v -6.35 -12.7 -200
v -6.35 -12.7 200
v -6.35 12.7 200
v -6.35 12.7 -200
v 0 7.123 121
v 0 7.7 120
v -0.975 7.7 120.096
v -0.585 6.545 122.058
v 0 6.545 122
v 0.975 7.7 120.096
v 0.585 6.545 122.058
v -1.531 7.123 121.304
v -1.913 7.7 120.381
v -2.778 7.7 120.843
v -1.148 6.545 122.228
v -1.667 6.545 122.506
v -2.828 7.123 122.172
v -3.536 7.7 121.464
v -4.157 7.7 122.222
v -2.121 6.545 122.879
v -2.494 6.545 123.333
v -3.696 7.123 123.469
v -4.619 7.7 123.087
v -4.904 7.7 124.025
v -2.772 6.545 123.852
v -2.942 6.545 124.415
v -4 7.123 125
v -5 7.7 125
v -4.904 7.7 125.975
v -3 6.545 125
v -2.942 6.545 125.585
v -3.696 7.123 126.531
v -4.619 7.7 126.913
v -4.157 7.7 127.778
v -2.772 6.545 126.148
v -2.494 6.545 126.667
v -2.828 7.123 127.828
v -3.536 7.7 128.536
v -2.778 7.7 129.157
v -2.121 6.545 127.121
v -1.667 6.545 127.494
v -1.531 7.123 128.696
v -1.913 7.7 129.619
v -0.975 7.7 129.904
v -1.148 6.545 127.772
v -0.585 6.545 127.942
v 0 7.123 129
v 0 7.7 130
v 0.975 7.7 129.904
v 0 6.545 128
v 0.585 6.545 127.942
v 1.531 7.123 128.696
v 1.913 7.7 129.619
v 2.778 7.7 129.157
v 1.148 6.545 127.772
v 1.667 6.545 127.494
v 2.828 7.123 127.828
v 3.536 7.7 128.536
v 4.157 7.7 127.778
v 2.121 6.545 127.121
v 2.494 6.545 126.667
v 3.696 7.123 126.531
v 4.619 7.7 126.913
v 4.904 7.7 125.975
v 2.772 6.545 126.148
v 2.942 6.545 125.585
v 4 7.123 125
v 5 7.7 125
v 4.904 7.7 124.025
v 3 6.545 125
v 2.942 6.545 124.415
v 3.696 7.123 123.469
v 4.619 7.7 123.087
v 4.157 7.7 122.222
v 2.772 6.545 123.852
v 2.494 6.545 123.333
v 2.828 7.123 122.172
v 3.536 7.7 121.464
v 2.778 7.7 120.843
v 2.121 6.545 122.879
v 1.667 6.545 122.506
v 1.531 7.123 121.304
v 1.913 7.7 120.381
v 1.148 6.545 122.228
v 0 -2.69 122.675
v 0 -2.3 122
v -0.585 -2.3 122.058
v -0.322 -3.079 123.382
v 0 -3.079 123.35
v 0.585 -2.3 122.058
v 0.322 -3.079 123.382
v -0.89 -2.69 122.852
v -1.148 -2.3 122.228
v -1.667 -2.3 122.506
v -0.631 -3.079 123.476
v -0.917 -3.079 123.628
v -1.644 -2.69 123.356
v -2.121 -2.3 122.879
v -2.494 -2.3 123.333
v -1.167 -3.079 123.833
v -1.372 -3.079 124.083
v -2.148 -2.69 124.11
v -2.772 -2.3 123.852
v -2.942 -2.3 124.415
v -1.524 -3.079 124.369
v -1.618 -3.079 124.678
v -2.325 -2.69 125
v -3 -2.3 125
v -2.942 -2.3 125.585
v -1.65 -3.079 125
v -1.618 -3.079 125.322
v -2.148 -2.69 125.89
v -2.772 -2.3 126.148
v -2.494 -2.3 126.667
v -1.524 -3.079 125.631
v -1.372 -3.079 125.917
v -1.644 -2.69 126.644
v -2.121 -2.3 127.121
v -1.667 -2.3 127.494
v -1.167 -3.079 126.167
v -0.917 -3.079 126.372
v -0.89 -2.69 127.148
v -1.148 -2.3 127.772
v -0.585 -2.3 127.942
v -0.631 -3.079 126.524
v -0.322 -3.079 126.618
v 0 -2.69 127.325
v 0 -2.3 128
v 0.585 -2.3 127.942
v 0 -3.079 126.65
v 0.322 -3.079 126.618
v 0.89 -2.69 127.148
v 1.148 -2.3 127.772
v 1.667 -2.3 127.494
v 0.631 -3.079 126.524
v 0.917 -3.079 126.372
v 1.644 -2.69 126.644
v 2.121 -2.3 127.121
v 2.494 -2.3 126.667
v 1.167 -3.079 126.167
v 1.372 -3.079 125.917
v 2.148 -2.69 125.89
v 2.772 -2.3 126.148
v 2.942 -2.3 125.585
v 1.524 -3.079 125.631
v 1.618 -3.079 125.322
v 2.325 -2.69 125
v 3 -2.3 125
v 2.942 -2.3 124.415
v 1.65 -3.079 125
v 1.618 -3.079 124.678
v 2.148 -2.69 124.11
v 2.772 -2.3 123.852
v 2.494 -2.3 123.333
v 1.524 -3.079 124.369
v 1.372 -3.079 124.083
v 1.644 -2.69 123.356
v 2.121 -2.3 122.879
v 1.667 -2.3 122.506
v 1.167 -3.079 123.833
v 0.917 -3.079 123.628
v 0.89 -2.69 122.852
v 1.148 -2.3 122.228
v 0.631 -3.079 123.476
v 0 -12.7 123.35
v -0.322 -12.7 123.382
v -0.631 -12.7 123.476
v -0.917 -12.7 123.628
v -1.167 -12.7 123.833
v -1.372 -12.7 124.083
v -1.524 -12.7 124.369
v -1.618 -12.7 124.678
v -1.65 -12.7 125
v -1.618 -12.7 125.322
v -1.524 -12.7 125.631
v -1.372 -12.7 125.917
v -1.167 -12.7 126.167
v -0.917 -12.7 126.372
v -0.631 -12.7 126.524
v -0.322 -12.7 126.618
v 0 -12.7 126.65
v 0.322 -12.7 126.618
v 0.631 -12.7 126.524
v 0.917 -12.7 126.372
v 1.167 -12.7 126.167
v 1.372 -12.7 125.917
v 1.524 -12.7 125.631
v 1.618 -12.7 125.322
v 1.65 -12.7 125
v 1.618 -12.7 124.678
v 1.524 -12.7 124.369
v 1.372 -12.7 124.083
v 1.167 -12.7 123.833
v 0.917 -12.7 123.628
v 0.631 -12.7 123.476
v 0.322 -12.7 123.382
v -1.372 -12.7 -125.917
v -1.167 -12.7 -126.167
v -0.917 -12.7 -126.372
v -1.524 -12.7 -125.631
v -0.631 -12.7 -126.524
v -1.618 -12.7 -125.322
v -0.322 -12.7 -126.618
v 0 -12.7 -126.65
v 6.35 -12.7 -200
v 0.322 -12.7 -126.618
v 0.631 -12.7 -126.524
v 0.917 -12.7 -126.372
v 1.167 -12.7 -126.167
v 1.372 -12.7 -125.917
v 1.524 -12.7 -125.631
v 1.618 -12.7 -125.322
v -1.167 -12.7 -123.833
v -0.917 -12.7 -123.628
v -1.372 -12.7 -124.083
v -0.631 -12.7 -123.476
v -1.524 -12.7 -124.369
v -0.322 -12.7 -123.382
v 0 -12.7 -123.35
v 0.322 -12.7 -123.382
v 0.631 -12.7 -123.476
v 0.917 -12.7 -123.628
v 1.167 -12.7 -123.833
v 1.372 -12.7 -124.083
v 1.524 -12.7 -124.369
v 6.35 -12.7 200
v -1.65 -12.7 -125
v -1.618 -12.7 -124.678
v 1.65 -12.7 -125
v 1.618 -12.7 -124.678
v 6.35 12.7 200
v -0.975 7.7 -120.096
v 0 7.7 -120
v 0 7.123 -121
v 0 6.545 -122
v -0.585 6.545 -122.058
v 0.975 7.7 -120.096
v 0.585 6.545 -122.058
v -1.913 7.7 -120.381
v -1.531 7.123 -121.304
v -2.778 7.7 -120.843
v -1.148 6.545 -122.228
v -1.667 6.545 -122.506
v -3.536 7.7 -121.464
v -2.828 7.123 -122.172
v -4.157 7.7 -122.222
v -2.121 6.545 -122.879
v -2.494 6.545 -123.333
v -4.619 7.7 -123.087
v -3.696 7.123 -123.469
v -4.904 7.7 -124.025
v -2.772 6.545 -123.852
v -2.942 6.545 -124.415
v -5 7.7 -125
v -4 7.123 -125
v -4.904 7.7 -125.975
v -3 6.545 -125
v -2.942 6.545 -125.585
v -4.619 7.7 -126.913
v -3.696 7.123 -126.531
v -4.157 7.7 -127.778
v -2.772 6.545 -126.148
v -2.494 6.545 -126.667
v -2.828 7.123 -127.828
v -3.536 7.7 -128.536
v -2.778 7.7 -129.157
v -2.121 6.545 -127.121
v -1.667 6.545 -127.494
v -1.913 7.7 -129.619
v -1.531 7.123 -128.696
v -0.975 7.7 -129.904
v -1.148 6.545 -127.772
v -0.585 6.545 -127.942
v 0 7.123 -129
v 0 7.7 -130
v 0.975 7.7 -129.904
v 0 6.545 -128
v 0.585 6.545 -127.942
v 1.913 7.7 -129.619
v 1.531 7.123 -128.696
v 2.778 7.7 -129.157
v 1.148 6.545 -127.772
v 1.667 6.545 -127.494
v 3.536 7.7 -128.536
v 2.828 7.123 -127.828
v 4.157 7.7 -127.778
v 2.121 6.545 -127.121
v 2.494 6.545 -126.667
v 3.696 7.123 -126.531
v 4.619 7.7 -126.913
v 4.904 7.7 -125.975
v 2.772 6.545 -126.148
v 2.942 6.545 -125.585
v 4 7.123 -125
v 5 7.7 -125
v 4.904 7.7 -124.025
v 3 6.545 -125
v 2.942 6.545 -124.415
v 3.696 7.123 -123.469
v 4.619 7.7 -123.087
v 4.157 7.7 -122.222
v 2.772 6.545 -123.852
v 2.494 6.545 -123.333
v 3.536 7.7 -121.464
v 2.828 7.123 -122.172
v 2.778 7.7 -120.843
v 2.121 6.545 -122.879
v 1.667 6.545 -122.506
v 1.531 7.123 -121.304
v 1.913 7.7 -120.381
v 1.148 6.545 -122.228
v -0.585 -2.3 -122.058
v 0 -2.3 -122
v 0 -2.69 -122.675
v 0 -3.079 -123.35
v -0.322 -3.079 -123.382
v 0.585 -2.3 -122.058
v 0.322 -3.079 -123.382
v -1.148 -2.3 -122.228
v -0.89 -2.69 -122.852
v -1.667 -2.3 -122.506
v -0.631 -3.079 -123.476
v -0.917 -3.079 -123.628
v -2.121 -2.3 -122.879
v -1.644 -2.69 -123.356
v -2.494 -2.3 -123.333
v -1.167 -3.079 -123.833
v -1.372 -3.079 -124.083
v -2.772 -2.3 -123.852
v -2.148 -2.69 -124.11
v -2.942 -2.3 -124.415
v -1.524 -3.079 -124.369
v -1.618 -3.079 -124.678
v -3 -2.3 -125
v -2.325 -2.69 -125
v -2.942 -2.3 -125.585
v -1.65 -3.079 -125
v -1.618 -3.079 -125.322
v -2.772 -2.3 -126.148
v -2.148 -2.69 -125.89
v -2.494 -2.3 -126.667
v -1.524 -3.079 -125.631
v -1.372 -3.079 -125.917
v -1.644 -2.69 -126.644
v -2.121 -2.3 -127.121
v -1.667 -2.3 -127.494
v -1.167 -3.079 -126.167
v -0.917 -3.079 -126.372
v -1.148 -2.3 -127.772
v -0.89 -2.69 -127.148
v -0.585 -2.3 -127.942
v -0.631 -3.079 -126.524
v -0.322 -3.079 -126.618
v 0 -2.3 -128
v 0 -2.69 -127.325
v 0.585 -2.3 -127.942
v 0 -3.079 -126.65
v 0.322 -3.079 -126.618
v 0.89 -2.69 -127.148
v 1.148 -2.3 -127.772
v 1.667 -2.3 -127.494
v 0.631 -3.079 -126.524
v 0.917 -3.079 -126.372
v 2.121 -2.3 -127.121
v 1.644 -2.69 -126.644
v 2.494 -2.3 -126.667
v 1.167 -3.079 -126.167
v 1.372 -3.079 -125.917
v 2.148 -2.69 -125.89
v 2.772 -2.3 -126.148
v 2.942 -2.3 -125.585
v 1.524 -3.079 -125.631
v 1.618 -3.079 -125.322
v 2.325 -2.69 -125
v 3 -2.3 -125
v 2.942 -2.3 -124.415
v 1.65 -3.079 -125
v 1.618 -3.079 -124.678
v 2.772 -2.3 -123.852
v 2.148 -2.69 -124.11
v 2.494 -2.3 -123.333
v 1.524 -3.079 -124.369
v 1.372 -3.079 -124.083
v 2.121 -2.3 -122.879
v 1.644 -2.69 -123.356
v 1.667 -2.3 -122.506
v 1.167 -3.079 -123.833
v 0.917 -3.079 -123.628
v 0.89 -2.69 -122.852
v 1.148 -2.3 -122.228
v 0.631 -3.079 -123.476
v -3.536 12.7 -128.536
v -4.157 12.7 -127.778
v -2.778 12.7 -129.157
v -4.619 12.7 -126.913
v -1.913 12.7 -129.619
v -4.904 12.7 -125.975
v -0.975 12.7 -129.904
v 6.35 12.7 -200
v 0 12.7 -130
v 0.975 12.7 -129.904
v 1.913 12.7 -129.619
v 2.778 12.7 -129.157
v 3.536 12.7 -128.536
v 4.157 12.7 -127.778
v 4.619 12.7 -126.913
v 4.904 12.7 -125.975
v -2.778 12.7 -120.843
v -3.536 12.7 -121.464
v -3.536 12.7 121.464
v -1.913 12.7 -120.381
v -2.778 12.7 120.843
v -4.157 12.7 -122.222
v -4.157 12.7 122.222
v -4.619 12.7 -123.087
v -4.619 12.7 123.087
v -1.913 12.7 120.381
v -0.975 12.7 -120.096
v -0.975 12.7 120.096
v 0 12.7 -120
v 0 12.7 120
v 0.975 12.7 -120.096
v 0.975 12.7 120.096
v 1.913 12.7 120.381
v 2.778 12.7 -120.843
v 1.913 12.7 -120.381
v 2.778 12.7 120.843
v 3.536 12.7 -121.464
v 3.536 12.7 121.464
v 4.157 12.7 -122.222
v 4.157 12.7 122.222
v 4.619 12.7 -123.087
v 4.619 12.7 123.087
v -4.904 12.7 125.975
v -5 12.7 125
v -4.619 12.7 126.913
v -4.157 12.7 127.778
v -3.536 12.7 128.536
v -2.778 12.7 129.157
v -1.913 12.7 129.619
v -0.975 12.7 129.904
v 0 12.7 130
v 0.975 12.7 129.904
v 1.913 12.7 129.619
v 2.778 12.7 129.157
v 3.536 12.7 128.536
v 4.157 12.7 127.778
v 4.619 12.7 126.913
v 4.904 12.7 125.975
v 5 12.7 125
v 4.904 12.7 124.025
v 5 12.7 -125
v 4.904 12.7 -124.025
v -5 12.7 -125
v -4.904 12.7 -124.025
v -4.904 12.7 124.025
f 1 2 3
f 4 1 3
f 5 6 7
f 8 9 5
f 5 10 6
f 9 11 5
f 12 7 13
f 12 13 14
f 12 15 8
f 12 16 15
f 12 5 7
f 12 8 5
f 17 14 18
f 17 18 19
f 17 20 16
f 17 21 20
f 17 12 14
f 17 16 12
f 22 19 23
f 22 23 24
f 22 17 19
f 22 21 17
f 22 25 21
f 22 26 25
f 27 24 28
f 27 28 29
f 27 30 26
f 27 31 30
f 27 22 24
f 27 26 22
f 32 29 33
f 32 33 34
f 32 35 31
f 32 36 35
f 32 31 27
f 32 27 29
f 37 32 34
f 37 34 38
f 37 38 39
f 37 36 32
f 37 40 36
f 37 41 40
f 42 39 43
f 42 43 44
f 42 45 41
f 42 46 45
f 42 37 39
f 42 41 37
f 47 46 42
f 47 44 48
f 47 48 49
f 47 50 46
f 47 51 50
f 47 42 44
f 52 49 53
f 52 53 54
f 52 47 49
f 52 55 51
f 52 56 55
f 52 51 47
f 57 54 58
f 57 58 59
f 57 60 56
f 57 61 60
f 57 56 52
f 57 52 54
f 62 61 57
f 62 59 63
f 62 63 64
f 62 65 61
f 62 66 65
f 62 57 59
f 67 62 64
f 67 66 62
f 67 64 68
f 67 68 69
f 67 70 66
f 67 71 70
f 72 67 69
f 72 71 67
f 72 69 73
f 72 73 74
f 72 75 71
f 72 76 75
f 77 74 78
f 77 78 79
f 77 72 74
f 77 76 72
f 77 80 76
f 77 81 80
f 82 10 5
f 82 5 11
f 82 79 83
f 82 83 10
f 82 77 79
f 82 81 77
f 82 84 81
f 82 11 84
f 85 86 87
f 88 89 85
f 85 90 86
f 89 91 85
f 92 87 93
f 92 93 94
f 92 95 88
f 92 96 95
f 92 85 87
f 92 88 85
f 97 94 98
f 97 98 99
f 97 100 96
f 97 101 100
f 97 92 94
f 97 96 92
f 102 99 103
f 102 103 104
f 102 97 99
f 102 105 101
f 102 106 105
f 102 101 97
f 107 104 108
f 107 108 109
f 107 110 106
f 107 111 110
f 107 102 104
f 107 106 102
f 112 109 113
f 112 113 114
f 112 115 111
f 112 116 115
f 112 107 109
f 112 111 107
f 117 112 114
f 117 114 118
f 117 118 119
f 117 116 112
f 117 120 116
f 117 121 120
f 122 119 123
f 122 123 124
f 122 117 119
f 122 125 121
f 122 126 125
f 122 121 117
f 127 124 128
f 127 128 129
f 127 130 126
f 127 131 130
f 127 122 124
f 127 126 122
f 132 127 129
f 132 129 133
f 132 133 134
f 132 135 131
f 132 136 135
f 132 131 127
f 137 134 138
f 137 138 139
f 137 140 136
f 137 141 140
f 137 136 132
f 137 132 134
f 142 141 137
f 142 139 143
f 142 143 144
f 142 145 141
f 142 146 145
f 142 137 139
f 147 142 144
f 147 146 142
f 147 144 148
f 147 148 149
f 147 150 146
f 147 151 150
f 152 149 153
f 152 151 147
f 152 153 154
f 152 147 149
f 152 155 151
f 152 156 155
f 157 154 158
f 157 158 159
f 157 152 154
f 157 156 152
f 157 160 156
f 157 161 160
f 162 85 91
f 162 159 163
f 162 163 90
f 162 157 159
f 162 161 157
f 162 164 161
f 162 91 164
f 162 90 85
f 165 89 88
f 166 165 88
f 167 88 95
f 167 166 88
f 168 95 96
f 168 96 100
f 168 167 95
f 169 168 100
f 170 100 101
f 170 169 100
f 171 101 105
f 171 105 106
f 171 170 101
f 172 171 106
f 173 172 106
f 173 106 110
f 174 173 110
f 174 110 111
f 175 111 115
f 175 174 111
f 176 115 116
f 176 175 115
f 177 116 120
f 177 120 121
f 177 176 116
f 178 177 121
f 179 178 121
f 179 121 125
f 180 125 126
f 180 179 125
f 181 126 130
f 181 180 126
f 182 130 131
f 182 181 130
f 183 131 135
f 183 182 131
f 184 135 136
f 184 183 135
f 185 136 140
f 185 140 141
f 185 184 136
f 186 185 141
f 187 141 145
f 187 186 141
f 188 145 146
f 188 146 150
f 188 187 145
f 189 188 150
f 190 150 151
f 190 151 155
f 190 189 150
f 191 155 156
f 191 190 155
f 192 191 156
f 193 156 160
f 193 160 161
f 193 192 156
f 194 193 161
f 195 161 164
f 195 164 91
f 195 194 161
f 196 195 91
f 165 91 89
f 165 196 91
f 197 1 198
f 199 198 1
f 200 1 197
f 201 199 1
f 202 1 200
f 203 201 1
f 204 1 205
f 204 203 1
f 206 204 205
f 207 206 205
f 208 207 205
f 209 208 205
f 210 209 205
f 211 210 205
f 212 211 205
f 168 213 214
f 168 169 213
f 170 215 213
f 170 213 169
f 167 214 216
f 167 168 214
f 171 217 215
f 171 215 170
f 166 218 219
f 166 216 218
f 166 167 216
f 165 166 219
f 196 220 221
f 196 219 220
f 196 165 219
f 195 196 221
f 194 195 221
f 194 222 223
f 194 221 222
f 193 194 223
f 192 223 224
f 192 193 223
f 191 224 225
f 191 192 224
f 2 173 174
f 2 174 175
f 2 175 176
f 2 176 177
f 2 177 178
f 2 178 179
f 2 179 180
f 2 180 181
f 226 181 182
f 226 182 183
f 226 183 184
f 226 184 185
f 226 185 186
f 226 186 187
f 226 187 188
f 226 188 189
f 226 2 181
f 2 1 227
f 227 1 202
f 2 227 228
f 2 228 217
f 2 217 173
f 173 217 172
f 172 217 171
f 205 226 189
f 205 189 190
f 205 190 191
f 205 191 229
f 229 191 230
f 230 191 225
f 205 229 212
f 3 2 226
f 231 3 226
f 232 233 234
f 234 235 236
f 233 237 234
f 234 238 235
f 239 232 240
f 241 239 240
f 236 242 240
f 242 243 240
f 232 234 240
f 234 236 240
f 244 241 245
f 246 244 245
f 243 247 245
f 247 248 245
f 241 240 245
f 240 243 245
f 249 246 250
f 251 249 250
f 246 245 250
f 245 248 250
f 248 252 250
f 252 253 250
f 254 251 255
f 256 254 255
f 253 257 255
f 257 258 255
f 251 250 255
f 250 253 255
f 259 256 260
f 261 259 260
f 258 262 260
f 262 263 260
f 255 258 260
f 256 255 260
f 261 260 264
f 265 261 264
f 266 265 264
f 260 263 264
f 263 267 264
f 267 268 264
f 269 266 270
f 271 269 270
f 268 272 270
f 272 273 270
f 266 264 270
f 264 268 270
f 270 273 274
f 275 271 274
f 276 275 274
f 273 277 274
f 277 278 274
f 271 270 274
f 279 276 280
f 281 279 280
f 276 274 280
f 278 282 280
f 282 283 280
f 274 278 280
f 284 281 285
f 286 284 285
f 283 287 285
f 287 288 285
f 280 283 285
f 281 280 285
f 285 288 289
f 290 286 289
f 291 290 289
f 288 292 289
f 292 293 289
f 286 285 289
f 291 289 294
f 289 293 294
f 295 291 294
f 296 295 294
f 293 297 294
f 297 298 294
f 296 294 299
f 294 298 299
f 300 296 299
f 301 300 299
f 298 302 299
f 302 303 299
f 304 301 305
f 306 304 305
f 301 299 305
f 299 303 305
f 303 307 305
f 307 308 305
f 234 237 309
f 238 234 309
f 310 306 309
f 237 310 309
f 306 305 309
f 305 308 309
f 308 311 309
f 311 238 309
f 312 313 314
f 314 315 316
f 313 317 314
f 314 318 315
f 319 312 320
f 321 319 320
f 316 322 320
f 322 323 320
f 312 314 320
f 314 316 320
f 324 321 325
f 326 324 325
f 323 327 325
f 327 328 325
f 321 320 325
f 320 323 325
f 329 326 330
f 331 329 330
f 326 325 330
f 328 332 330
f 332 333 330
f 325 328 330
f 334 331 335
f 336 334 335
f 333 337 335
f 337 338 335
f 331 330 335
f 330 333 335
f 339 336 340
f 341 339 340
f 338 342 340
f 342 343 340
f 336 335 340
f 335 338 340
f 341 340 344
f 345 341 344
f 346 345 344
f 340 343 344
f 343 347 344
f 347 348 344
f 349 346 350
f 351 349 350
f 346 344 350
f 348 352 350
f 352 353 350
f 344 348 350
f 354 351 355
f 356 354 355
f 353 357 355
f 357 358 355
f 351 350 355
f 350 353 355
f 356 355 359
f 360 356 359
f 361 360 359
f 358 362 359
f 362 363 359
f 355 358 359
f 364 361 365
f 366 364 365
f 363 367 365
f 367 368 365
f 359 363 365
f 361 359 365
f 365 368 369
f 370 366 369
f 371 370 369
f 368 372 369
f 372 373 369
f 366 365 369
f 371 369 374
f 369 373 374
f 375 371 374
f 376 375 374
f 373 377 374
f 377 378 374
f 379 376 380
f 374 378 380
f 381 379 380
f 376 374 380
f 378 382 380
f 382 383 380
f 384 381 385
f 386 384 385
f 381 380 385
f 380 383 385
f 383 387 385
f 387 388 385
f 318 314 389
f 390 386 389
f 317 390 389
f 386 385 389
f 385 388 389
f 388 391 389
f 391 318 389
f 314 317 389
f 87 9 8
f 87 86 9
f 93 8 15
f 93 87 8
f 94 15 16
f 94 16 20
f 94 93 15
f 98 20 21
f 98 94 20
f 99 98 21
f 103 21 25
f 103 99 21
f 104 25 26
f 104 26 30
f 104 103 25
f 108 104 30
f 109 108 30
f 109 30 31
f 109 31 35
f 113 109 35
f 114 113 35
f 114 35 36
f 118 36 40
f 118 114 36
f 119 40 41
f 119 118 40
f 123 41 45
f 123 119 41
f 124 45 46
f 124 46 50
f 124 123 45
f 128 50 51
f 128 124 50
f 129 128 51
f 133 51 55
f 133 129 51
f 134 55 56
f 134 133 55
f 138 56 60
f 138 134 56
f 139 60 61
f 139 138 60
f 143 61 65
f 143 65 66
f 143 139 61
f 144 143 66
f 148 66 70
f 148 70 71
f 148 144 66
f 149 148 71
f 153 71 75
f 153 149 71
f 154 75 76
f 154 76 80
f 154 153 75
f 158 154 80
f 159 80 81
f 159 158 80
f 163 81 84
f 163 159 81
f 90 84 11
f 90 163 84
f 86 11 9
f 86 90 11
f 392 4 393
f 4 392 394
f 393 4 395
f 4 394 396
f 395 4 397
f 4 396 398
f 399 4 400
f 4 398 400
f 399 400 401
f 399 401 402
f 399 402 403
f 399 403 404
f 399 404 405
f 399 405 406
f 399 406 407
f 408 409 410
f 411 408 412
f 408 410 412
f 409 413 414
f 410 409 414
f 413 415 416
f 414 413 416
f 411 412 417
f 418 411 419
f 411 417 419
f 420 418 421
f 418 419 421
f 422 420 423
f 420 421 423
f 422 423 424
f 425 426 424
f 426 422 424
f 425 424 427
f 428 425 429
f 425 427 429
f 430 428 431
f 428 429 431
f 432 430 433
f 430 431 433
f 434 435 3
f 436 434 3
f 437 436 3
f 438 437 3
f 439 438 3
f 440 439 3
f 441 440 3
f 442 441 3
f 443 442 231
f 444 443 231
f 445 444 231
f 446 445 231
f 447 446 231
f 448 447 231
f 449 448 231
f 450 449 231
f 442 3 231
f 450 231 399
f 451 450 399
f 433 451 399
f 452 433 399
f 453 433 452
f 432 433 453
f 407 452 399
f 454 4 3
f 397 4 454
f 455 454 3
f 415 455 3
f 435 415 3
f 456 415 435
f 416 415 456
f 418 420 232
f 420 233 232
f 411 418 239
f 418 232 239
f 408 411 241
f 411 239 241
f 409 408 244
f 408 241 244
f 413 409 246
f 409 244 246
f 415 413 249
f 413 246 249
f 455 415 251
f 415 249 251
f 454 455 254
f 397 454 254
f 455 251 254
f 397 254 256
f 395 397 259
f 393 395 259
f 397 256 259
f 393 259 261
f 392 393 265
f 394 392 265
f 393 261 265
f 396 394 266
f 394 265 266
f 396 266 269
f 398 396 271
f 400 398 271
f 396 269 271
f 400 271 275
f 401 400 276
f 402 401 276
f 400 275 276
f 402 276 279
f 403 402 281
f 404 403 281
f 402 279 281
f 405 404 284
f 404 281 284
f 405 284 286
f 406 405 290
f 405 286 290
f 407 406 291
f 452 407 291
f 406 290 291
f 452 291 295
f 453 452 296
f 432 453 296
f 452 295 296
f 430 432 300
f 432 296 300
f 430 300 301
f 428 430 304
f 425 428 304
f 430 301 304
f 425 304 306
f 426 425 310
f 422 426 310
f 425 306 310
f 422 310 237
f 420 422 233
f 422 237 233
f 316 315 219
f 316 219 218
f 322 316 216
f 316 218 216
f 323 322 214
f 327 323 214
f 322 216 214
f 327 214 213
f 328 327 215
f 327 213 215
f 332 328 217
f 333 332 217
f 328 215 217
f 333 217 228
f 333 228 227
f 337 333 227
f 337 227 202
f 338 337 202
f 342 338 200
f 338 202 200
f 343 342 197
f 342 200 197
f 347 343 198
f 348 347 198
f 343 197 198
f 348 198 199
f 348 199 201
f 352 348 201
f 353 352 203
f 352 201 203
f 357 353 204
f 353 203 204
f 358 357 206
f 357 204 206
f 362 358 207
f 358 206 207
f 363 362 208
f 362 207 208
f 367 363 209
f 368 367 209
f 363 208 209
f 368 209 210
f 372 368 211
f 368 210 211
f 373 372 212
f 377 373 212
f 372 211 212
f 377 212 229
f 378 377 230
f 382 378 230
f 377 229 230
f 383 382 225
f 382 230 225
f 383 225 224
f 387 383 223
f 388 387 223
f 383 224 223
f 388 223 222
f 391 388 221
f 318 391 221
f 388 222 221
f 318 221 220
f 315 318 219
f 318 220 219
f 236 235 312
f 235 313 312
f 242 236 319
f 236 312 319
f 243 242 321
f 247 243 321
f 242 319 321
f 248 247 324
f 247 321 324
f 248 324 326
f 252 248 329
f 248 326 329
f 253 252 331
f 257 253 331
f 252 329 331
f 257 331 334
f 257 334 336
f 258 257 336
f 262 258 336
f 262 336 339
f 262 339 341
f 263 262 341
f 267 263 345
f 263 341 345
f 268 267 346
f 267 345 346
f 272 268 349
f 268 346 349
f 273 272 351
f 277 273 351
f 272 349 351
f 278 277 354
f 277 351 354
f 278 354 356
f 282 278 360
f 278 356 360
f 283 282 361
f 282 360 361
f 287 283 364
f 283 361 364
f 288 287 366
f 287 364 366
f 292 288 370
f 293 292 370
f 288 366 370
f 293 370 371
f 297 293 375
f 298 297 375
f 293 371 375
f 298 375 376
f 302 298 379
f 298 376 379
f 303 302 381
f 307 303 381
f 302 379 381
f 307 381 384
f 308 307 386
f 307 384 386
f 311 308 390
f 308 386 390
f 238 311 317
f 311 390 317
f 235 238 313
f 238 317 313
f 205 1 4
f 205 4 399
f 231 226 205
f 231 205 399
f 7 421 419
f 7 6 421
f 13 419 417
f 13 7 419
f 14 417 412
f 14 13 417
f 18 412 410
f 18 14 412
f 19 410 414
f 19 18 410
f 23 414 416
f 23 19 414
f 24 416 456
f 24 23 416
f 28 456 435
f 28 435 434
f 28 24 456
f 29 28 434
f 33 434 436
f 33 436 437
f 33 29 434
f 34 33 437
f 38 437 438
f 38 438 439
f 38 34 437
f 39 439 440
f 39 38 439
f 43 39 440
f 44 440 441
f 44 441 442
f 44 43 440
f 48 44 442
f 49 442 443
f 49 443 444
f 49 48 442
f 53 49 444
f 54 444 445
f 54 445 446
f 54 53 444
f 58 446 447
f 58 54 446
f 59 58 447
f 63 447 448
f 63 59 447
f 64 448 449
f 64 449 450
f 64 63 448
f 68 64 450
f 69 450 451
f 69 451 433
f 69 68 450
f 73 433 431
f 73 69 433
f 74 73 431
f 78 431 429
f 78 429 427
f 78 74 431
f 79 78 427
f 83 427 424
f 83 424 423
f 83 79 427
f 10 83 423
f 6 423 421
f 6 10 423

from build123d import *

# Parameters (mm, degrees)
BOSS_EXTRUDE1_DEPTH      = 200
BOSS_EXTRUDE1_DEPTH_BACK = 200
SKETCH1_W                = 12.7
SKETCH1_H                = 25.4


with BuildPart() as part:
    # Sketch1 → Boss-Extrude1 (new, two sides: drawn at the far end of the back side and taken through both)
    with BuildSketch(Plane.XY.offset(-BOSS_EXTRUDE1_DEPTH_BACK)):
        Rectangle(SKETCH1_W, SKETCH1_H)
    extrude(amount=BOSS_EXTRUDE1_DEPTH + BOSS_EXTRUDE1_DEPTH_BACK)

    # Sketch2 → Cut-Revolve1 (revolve, cut)
    with BuildSketch(Plane(origin=(0, 0, 0), x_dir=(0, 0, -1), z_dir=(1, 0, 0))):
        Polygon((-125, 12.7), (-120, 12.7), (-120, 7.7), (-122, 6.545299462), (-122, -2.3), (-123.35, -3.079422863), (-123.35, -12.7), (-125, -12.7), align=None)
    cut_revolve1 = revolve(axis=Axis((0, -12.7, 125), (0, 1, 0)), mode=Mode.SUBTRACT)

    # Mirror1: Cut-Revolve1 across plane
    add(cut_revolve1.mirror(Plane.XY), mode=Mode.SUBTRACT)


solid = part.part
